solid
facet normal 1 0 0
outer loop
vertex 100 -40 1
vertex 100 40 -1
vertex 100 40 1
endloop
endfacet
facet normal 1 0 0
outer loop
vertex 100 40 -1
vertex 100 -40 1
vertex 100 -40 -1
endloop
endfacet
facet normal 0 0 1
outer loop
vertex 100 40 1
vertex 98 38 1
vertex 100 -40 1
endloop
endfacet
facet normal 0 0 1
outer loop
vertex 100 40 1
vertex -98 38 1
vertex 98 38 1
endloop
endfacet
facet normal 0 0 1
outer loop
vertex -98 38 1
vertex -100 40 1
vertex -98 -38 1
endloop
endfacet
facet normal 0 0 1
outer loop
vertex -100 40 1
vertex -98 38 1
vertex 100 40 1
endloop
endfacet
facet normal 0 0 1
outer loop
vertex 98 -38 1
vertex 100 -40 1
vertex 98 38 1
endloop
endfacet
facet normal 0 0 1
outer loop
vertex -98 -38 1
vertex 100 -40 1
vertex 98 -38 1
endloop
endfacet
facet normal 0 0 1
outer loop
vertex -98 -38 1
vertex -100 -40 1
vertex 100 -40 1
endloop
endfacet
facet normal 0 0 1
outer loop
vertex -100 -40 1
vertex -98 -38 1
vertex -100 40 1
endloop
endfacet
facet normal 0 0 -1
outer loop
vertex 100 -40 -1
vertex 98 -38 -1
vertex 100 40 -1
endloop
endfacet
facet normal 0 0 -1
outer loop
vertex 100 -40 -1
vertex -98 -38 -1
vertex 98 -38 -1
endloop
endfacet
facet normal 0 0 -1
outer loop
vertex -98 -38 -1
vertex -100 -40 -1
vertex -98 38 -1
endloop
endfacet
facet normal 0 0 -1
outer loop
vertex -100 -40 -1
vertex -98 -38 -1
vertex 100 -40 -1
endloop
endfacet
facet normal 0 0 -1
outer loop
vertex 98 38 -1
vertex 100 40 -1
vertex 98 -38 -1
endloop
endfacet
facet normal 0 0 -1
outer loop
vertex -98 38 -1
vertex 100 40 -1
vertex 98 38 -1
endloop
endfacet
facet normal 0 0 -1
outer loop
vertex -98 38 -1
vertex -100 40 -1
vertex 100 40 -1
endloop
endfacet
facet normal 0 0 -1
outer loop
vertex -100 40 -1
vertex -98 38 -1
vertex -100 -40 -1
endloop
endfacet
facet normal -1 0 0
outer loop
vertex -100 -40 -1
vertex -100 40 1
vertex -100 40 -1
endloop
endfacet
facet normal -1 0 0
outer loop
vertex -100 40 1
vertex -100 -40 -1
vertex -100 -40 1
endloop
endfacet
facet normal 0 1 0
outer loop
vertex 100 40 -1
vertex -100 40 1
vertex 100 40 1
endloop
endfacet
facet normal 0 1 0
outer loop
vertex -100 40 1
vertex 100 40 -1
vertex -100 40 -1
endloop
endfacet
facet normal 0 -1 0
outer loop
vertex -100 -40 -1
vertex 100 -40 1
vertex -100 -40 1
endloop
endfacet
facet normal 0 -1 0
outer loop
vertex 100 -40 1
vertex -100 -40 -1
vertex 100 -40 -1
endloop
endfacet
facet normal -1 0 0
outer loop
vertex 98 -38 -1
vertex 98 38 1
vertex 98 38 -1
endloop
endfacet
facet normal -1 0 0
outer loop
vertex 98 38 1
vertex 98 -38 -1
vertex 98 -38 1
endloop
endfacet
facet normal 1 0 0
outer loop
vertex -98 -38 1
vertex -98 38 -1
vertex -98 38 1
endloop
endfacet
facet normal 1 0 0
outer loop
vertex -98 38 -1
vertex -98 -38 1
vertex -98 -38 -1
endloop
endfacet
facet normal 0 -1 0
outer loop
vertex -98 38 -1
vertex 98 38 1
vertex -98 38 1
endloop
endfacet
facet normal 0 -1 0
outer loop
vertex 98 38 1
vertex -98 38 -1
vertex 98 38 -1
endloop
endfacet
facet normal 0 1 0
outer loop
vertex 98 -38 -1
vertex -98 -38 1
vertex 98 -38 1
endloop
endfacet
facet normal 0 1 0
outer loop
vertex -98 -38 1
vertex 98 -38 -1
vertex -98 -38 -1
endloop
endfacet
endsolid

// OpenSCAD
bodySkeleton();

module bodySkeleton(body_length = 200, body_width = 80, bone_size = 2) {
    difference() {
        color("Gainsboro")
            cube([body_length, body_width, bone_size], center = true);
        cube([body_length - (bone_size * 2), body_width  - (bone_size * 2), bone_size * 2], center = true);
    }
}
